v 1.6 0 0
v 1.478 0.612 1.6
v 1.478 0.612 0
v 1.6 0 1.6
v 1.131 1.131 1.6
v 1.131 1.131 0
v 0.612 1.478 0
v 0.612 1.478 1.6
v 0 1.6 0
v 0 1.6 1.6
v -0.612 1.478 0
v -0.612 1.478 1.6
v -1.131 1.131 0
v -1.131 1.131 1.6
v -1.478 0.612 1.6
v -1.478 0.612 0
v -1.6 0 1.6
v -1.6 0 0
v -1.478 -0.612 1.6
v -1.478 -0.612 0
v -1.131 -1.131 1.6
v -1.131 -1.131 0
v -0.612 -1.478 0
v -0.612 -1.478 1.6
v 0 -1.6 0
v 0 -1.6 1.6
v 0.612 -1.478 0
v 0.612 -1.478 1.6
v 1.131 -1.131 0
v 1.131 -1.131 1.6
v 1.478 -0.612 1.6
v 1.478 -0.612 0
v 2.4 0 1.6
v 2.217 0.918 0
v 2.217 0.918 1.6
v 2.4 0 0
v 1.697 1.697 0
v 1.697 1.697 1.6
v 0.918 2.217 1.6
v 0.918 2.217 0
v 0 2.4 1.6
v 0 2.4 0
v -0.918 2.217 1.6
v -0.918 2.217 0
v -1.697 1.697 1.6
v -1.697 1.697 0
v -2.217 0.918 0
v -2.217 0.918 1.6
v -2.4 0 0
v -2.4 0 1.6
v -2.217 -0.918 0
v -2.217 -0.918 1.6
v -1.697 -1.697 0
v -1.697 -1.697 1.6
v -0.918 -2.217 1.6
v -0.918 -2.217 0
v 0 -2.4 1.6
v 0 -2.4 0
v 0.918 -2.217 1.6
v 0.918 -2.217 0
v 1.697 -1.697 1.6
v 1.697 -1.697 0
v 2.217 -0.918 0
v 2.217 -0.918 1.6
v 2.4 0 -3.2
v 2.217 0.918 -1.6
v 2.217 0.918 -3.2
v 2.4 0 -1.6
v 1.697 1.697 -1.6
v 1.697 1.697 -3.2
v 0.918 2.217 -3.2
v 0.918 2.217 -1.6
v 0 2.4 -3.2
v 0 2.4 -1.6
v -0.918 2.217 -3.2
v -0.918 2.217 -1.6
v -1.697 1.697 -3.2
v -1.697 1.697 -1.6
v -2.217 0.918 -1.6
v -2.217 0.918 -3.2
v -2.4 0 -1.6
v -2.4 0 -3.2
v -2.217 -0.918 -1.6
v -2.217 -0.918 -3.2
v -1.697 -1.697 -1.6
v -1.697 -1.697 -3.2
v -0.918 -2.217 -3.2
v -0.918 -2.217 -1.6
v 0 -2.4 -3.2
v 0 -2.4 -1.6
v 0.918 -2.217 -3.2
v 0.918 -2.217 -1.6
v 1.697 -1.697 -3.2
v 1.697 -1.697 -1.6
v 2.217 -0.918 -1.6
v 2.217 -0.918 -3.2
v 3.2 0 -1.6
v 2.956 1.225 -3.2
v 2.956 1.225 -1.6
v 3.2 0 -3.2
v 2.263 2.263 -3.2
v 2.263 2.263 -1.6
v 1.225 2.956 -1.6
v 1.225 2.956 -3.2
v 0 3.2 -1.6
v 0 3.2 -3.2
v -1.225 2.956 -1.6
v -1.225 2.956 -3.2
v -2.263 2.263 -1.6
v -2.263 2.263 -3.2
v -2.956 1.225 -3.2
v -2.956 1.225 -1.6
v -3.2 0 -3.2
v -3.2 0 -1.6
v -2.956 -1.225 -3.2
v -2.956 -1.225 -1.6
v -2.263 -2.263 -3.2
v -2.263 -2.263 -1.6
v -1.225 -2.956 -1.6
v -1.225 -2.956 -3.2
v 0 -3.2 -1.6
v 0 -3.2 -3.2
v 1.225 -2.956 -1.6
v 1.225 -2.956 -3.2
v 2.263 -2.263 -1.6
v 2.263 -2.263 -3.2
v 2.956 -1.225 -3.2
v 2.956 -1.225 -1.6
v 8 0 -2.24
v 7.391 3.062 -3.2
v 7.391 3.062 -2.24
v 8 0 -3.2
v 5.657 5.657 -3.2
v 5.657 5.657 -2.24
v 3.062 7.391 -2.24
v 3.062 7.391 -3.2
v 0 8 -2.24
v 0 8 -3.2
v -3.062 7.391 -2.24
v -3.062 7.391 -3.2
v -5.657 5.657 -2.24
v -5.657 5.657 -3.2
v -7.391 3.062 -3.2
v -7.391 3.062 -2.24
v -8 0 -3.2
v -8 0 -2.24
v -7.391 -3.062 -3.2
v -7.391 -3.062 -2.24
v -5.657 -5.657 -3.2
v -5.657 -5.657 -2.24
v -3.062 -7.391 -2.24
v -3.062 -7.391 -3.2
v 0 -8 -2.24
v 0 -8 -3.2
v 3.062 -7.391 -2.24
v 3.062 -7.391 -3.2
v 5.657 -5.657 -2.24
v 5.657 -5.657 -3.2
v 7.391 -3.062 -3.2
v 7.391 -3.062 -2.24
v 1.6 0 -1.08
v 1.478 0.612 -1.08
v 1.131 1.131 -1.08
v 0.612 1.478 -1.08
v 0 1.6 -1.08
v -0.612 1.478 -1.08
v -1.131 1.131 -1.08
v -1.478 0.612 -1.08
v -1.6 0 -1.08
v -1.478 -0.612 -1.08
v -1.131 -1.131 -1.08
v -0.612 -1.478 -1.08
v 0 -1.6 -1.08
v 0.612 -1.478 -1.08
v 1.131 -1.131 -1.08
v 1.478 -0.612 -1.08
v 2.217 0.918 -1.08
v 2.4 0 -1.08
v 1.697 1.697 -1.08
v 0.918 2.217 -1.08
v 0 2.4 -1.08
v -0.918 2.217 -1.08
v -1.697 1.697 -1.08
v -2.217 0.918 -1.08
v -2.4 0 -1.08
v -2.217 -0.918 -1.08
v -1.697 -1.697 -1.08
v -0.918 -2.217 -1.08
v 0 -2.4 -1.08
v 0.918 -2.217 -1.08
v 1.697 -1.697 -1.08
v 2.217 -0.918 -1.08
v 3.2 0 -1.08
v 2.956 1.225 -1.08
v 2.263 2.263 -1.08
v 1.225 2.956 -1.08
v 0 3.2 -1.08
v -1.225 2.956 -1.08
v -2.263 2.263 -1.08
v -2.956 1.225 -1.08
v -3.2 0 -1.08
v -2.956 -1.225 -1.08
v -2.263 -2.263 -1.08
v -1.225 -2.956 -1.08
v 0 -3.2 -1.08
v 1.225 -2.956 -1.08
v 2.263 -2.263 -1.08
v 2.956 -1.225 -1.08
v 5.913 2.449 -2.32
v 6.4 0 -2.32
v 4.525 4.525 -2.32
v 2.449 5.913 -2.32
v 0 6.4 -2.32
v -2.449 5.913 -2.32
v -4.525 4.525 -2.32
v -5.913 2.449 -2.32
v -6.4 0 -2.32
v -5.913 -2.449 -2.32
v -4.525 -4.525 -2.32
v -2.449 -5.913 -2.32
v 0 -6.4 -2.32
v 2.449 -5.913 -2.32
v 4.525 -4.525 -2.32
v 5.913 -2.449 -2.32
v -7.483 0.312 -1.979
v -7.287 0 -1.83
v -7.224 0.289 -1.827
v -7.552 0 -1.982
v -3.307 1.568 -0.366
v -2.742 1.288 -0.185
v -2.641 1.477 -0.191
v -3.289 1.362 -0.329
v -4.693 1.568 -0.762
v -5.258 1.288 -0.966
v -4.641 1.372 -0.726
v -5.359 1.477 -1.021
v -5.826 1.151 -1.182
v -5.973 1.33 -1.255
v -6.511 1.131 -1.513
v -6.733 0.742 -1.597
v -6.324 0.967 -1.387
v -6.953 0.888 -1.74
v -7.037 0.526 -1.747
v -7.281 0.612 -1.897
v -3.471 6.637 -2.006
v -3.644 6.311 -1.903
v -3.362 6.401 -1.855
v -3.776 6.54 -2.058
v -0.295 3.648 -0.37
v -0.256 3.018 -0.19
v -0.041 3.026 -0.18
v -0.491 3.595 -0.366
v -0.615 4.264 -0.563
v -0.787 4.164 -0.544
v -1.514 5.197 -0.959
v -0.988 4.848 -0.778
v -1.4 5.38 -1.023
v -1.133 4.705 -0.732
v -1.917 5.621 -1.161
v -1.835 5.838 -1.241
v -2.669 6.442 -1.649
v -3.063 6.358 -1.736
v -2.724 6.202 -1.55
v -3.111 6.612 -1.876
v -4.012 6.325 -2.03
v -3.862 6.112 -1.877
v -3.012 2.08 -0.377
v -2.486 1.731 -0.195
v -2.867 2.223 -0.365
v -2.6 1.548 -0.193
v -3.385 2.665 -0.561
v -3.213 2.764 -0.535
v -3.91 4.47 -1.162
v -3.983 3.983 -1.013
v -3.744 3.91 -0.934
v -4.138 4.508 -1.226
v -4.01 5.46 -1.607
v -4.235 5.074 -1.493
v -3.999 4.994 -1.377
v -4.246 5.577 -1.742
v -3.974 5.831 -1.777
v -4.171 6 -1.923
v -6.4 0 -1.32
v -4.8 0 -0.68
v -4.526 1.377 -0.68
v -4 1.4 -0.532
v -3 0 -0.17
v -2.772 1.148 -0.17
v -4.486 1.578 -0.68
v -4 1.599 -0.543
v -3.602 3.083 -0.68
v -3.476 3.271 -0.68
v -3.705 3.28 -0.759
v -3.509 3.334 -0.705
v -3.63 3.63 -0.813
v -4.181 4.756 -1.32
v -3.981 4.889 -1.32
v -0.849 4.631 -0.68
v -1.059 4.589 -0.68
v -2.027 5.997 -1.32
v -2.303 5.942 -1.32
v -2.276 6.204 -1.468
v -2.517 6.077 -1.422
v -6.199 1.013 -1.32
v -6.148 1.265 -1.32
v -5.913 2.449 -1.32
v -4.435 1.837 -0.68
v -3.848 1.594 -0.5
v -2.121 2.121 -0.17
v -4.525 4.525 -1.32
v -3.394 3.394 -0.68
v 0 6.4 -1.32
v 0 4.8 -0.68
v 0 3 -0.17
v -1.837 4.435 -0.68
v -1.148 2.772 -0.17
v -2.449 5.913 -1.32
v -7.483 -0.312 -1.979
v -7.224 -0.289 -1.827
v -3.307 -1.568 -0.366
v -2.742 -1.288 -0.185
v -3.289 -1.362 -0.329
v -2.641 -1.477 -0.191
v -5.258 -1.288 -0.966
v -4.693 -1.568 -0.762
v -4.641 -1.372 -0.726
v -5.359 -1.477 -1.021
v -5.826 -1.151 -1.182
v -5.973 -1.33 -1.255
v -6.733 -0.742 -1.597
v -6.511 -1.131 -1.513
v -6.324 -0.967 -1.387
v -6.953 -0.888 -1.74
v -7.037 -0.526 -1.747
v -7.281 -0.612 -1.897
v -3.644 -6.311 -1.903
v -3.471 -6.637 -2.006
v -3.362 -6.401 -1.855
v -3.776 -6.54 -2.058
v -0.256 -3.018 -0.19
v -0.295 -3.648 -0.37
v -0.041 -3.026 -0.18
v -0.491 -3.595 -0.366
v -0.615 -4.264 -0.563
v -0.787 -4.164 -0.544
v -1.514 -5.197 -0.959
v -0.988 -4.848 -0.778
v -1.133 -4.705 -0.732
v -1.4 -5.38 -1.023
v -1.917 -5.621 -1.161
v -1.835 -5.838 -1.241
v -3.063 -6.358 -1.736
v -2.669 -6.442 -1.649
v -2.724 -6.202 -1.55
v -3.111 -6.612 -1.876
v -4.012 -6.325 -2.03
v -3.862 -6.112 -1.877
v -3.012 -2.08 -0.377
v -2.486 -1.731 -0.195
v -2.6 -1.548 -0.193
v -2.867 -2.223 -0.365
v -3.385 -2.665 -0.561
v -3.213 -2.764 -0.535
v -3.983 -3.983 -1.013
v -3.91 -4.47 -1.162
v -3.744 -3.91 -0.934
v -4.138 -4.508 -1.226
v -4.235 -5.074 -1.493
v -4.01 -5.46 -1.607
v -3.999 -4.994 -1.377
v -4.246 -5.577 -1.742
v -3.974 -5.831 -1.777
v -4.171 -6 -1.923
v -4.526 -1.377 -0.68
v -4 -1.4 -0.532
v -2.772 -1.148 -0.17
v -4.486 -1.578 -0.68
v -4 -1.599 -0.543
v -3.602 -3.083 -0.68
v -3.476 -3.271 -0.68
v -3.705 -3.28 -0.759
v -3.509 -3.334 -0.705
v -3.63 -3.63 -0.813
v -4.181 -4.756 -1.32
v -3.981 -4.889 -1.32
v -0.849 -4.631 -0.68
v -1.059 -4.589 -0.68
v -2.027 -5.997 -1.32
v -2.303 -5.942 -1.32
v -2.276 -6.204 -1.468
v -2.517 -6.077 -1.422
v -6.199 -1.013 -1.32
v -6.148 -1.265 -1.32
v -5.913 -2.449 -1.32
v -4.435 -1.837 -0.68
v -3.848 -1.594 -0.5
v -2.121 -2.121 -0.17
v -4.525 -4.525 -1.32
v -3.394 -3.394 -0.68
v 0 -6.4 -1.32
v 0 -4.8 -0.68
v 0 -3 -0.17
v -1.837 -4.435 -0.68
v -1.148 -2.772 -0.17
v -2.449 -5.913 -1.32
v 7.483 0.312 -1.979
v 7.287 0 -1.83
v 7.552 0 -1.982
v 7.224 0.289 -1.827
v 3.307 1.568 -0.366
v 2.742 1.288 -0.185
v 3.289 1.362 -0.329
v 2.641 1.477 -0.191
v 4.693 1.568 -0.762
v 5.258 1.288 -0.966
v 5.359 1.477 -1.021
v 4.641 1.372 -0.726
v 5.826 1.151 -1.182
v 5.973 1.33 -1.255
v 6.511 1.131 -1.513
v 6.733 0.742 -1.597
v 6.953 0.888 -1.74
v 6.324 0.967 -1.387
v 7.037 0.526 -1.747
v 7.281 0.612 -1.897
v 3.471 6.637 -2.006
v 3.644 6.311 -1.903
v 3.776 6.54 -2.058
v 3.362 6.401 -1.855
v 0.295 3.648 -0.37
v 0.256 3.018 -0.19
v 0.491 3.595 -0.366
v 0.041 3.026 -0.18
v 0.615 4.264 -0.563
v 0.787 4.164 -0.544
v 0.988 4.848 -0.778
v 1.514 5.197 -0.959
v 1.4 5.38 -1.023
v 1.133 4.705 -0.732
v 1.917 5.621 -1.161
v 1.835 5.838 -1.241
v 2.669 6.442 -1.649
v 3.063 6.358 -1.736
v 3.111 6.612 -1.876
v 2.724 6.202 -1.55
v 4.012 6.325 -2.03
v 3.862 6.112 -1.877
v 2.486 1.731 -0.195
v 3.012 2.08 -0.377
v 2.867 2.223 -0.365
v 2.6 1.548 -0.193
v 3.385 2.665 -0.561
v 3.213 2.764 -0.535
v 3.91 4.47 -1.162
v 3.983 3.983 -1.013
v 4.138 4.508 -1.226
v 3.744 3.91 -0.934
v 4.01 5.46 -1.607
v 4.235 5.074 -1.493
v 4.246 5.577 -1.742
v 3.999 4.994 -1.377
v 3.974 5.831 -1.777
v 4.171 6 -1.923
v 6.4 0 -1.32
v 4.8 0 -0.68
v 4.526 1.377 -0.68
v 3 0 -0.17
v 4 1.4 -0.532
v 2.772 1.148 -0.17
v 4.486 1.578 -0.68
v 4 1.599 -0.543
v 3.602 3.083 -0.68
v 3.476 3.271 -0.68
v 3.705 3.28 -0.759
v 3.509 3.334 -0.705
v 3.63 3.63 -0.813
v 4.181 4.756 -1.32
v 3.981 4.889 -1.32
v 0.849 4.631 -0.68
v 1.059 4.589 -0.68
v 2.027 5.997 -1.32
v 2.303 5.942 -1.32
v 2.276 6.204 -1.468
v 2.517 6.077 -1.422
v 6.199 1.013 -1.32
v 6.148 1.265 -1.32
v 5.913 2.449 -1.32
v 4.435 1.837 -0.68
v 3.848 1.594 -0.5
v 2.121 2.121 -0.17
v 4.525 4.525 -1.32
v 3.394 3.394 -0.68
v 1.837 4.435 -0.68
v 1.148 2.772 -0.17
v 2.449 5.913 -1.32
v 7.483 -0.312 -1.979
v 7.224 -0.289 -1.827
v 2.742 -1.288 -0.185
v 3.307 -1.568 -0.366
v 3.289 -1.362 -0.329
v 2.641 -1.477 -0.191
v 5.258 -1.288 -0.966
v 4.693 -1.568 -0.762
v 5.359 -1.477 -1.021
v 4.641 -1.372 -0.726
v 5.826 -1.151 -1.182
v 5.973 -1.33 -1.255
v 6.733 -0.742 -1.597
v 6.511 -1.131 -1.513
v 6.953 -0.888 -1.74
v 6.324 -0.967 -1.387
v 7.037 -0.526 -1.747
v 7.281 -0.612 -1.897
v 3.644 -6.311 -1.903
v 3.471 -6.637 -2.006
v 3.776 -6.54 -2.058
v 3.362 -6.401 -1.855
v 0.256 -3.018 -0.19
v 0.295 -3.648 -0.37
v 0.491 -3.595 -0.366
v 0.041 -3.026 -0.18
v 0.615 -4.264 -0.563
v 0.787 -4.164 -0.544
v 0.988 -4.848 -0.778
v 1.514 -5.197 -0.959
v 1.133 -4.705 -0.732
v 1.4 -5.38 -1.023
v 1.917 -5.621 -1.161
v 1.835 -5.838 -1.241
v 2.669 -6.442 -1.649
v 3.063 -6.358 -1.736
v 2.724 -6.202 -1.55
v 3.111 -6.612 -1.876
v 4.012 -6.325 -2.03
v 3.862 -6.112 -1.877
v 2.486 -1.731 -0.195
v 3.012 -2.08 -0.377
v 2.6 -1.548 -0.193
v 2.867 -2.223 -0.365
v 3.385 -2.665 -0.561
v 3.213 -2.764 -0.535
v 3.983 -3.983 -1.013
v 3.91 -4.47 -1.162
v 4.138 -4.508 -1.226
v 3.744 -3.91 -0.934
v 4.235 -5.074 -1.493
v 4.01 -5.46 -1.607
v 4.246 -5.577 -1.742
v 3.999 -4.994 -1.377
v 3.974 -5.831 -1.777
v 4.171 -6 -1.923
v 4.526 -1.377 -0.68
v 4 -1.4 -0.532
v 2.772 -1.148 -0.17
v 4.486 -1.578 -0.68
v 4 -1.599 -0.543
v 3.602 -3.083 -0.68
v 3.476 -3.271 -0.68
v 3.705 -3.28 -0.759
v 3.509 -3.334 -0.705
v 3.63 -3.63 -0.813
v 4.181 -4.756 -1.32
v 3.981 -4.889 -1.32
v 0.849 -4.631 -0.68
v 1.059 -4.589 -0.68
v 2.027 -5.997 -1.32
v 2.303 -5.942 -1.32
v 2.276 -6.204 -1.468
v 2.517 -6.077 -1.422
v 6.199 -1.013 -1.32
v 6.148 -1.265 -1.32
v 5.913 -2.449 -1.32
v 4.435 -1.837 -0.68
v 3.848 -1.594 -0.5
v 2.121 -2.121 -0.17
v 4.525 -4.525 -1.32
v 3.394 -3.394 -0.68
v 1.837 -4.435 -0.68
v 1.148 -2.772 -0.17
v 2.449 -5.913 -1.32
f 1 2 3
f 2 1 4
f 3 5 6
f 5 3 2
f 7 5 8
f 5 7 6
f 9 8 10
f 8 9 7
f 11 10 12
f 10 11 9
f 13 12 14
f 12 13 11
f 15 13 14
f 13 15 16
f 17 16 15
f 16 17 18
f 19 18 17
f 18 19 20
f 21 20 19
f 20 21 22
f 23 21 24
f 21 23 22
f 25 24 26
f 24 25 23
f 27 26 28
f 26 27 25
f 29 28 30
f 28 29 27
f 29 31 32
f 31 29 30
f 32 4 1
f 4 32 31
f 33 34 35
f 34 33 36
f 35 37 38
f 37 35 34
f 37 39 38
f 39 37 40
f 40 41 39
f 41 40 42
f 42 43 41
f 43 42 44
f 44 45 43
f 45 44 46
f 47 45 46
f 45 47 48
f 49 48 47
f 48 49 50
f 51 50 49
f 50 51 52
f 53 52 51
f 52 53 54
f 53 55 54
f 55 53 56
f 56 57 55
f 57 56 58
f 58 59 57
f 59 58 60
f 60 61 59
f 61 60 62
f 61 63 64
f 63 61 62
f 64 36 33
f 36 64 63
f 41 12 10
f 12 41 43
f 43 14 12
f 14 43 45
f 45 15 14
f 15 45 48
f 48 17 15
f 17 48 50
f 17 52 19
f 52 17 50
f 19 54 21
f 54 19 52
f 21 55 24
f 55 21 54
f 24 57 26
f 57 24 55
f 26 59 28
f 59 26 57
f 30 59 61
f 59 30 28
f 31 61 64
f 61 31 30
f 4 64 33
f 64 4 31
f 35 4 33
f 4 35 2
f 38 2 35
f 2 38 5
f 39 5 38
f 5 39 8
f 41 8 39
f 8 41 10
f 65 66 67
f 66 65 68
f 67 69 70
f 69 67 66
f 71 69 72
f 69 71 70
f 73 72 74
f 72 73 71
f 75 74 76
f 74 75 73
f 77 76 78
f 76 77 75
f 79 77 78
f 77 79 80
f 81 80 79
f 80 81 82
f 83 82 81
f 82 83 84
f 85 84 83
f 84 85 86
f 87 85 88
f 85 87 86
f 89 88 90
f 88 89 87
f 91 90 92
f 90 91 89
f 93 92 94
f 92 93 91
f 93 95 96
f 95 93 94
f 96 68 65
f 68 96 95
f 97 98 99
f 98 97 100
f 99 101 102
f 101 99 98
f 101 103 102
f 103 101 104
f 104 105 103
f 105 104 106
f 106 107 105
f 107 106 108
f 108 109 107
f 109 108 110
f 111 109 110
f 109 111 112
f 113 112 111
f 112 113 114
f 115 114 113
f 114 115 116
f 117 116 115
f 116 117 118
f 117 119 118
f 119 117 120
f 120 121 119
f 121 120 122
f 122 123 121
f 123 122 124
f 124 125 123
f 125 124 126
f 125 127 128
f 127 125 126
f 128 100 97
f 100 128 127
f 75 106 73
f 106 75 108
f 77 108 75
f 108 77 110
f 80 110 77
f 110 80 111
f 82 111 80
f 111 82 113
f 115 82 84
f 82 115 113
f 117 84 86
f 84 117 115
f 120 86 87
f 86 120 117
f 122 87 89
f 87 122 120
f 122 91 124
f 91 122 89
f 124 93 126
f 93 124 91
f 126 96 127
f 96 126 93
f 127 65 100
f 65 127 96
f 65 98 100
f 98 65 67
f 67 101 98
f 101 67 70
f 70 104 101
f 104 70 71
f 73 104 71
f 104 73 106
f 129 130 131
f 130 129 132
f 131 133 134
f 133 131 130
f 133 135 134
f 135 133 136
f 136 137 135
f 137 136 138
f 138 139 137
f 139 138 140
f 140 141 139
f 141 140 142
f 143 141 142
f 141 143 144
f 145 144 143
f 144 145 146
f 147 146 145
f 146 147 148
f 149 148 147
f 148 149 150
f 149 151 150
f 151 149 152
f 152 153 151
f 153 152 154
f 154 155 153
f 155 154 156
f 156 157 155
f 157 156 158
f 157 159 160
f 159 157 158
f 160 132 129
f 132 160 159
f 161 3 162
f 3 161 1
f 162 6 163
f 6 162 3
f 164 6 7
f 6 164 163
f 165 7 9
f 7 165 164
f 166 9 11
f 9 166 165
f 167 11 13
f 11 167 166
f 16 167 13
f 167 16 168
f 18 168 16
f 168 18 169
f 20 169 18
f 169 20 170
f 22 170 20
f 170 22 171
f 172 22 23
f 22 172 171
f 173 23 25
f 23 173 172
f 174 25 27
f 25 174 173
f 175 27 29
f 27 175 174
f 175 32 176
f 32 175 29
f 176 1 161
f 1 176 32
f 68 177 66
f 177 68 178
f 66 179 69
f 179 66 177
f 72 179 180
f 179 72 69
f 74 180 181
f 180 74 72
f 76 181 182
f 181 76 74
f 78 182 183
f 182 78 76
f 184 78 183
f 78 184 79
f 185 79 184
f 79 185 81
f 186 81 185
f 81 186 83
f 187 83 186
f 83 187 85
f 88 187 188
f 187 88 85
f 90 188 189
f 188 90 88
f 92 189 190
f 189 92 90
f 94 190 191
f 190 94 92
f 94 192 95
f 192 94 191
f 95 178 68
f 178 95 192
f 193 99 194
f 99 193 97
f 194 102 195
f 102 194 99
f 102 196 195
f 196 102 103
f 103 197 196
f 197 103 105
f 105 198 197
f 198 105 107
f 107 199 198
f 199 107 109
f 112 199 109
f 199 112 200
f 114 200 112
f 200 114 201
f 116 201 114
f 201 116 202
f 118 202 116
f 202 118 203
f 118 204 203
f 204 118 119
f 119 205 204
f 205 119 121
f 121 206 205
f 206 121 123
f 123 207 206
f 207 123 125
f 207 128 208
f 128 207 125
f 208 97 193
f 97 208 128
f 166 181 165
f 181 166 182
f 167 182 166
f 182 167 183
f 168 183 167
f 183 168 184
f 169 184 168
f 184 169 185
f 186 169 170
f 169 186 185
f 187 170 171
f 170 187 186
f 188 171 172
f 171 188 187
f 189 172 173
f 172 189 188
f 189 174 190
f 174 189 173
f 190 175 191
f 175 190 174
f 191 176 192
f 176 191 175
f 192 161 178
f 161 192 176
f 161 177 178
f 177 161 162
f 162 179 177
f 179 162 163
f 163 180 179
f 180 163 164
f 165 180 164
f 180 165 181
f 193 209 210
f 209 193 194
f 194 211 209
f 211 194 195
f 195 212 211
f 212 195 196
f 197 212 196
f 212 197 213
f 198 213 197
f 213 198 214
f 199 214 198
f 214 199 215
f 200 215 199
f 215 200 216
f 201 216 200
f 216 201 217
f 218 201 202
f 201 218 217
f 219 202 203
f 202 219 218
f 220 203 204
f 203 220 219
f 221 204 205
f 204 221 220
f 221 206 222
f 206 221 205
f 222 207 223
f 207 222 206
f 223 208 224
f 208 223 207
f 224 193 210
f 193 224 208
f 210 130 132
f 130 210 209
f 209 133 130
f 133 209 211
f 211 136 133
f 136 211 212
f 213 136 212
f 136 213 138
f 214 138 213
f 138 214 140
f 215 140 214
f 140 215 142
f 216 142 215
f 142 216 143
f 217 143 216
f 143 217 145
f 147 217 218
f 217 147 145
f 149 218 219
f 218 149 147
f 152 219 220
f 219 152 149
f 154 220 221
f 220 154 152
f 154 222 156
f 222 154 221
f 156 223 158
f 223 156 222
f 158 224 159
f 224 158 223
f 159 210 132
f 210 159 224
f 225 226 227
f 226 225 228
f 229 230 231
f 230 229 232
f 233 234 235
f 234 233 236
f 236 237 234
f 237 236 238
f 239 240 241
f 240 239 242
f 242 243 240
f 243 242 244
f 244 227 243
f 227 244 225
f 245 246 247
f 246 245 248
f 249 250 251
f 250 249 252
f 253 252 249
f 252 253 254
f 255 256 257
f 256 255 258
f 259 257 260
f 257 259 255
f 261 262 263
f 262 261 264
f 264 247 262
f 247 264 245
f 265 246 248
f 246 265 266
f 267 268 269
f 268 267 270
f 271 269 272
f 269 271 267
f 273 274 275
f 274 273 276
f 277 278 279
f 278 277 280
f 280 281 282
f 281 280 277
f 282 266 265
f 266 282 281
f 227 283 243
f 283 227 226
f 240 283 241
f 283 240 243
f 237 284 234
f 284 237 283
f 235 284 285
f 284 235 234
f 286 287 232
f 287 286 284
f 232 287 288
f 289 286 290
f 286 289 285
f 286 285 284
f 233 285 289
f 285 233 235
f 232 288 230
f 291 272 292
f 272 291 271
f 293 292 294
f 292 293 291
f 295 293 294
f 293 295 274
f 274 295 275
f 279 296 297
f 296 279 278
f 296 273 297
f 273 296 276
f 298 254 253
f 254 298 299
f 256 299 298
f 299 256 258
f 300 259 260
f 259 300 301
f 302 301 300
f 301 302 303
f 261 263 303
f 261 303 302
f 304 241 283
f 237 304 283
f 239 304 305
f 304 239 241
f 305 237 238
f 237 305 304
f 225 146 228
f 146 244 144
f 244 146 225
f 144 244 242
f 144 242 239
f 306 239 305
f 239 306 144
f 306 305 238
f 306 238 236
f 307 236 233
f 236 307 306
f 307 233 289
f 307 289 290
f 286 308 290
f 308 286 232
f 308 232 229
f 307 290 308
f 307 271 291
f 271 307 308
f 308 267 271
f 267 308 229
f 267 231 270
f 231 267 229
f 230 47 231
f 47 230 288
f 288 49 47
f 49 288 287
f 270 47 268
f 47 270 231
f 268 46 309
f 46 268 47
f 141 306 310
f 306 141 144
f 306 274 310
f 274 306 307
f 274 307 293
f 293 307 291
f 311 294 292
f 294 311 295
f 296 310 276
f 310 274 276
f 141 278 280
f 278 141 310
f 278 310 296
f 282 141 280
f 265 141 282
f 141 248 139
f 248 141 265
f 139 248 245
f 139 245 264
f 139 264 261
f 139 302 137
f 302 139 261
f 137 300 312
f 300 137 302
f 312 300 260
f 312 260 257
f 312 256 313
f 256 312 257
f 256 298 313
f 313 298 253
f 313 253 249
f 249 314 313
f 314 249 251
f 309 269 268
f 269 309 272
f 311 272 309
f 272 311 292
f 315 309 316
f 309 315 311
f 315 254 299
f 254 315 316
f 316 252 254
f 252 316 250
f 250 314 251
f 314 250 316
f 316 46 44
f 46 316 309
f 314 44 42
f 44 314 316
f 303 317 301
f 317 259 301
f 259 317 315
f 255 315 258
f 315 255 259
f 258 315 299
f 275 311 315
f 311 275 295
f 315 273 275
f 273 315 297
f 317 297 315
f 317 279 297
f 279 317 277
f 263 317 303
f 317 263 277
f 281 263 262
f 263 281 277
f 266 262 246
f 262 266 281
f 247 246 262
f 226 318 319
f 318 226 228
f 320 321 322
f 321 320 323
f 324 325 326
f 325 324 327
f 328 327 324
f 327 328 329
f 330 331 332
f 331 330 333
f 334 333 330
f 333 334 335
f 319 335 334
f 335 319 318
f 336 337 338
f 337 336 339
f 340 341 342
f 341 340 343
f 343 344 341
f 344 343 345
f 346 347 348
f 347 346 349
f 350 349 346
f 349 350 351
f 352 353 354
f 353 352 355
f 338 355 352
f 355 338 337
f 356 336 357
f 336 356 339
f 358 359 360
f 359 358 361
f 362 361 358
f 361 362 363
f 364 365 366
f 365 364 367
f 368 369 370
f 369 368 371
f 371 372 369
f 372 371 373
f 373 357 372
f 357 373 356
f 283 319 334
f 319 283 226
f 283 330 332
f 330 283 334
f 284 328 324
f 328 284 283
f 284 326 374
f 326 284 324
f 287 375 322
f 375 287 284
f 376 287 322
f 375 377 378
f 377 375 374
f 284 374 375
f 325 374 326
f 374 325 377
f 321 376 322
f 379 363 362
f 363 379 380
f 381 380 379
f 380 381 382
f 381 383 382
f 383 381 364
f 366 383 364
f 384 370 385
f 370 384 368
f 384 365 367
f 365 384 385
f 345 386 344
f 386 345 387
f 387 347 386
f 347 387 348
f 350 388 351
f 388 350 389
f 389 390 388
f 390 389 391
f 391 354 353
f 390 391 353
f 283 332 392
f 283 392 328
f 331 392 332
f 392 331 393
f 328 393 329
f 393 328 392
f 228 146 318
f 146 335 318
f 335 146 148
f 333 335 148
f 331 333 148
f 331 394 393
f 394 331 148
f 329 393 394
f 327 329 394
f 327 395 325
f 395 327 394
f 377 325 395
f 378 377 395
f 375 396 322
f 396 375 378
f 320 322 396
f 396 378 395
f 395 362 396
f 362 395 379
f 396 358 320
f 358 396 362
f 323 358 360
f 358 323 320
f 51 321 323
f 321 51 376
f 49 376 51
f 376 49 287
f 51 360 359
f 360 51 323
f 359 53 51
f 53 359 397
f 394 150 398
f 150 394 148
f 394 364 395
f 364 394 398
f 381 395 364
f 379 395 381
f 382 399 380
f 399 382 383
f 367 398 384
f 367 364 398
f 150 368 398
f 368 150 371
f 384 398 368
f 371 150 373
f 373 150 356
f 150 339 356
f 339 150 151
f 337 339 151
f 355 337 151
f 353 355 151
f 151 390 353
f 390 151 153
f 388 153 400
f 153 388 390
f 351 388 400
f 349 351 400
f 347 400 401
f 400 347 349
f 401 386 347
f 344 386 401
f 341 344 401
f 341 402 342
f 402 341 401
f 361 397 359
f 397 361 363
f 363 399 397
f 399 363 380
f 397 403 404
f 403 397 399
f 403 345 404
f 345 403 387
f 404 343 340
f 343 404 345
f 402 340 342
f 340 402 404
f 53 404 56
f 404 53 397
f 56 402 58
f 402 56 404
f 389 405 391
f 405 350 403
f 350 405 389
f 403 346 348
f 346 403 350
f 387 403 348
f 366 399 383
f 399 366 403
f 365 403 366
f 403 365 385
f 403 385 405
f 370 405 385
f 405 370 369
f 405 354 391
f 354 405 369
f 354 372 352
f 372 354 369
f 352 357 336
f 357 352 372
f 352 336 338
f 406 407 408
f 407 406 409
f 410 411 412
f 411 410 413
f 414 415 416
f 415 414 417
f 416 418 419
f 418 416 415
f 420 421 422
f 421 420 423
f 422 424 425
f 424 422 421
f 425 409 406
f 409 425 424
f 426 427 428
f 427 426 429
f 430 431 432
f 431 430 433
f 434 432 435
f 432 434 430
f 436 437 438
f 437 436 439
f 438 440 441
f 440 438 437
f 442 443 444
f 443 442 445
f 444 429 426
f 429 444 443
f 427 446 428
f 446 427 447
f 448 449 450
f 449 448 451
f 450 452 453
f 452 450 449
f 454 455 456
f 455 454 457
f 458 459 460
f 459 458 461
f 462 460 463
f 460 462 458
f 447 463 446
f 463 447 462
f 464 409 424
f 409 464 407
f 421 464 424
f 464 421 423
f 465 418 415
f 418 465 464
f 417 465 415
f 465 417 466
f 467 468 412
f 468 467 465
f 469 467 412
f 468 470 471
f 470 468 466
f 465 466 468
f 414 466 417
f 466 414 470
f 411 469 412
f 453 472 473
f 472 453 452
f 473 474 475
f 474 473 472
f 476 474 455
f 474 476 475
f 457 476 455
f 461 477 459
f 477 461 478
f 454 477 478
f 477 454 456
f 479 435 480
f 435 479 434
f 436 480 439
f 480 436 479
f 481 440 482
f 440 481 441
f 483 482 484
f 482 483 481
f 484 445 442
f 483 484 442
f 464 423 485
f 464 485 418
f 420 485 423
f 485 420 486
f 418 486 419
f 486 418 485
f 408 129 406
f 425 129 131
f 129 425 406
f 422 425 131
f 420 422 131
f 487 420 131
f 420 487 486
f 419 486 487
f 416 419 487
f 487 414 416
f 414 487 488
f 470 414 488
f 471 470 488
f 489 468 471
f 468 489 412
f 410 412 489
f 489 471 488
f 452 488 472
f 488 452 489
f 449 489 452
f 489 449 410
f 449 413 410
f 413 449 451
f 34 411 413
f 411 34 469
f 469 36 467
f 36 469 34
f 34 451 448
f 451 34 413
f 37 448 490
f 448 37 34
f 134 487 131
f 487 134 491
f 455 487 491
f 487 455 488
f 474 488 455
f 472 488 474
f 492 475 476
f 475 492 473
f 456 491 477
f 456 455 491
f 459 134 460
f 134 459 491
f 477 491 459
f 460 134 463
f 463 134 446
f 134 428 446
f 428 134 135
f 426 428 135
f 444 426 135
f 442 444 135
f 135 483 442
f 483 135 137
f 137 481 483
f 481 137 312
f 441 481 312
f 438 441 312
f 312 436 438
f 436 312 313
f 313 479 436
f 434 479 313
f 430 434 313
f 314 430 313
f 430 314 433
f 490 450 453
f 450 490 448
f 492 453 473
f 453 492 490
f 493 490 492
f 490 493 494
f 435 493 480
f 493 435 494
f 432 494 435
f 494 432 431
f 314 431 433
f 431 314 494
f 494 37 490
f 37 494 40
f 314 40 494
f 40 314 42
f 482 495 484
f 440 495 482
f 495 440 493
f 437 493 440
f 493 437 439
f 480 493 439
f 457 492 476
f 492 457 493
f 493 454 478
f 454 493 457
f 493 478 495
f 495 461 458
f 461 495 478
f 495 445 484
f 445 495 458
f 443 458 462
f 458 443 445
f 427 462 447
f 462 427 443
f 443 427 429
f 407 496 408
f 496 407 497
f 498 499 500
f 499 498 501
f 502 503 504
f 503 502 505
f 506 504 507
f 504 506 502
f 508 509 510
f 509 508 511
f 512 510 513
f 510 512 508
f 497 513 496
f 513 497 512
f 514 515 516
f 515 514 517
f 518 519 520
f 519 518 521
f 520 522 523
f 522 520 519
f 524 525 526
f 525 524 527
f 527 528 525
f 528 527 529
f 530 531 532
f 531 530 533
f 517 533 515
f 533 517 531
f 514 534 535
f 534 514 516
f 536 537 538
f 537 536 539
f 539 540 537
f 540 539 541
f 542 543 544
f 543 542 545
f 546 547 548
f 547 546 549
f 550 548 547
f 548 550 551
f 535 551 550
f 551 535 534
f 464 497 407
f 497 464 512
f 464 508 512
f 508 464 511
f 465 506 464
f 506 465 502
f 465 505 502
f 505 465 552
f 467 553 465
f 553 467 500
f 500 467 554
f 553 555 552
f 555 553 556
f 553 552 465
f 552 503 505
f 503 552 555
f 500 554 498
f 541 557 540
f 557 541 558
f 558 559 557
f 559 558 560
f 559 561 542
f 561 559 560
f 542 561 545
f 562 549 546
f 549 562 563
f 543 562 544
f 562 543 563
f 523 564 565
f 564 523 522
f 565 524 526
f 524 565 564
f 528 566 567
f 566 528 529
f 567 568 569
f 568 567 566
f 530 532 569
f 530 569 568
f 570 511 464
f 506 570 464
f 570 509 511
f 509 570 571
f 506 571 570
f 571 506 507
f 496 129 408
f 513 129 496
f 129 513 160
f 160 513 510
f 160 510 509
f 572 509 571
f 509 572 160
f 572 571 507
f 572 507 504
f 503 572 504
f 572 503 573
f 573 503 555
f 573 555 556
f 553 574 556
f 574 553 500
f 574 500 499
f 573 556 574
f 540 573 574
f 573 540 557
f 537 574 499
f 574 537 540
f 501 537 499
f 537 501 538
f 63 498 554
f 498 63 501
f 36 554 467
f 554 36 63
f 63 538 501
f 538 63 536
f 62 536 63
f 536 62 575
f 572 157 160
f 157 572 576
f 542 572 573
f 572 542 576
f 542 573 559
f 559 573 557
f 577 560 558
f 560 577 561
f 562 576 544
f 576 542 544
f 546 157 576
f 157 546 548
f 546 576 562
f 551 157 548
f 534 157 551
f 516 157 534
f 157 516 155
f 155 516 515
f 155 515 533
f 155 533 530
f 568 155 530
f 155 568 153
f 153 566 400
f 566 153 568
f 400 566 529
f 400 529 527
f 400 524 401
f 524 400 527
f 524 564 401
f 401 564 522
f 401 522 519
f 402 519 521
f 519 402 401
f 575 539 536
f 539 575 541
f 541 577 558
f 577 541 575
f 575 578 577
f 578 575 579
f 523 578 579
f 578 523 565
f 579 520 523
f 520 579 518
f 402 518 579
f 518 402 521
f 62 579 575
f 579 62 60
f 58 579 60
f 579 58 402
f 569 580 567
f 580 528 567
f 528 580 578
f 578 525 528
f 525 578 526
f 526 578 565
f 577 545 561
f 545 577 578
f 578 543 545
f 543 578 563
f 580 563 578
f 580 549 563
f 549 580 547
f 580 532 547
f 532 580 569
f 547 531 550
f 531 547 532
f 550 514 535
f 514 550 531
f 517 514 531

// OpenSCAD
use <../lib.scad>
use <s/4740px1s01.scad>
use <s/4740s01.scad>
use <s/4740s02.scad>
function ldraw_lib__4740px1() = [
// 0 Dish  2 x  2 Inverted with Six Orange Petals Pattern
// 0 Name: 4740px1.dat
// 0 Author: Gerald Lasser [GeraldLasser]
// 0 !LDRAW_ORG Part UPDATE 2024-04
// 0 !LICENSE Licensed under CC BY 4.0 : see CAreadme.txt
// 
// 0 BFC CERTIFY CCW
  [0,"BFC","CERTIFY"],
  [0,"BFC","CCW"],
// 
// 0 !KEYWORDS Bricklink 4740pb012, Brickowl 161182, Mystery Machine
// 0 !KEYWORDS Rebrickable 4740pr0010, Scooby Doo, Set 75902
// 
// 0 !HISTORY 2024-04-12 [MagFors] used s01 subfile
// 0 !HISTORY 2024-05-28 [OrionP] Official Update 2024-04
// 
// 1 16 0 0 0 1 0 0 0 1 0 0 0 1 s\4740s01.dat
  [1,16,0,0,0,1,0,0,0,1,0,0,0,1, ldraw_lib__s__4740s01()],
// 1 16 0 0 0 1 0 0 0 1 0 0 0 1 s\4740s02.dat
  [1,16,0,0,0,1,0,0,0,1,0,0,0,1, ldraw_lib__s__4740s02()],
// 
// 1 16 0 0 0 1 0 0 0 1 0 0 0 1 s\4740px1s01.dat
  [1,16,0,0,0,1,0,0,0,1,0,0,0,1, ldraw_lib__s__4740px1s01()],
// 1 16 0 0 0 1 0 0 0 1 0 0 0 -1 s\4740px1s01.dat
  [1,16,0,0,0,1,0,0,0,1,0,0,0,-1, ldraw_lib__s__4740px1s01()],
// 1 16 0 0 0 -1 0 0 0 1 0 0 0 1 s\4740px1s01.dat
  [1,16,0,0,0,-1,0,0,0,1,0,0,0,1, ldraw_lib__s__4740px1s01()],
// 1 16 0 0 0 -1 0 0 0 1 0 0 0 -1 s\4740px1s01.dat
  [1,16,0,0,0,-1,0,0,0,1,0,0,0,-1, ldraw_lib__s__4740px1s01()],
];
module ldraw_lib__4740px1(step=0, col=false, unit=2/5, alt=false, line=0.2, solid=!$preview)
    makepoly(ldraw_lib__4740px1(), step=step, col=col, unit=unit, alt=alt, line=line, solid=solid);
ldraw_lib__4740px1(line=0.2);
